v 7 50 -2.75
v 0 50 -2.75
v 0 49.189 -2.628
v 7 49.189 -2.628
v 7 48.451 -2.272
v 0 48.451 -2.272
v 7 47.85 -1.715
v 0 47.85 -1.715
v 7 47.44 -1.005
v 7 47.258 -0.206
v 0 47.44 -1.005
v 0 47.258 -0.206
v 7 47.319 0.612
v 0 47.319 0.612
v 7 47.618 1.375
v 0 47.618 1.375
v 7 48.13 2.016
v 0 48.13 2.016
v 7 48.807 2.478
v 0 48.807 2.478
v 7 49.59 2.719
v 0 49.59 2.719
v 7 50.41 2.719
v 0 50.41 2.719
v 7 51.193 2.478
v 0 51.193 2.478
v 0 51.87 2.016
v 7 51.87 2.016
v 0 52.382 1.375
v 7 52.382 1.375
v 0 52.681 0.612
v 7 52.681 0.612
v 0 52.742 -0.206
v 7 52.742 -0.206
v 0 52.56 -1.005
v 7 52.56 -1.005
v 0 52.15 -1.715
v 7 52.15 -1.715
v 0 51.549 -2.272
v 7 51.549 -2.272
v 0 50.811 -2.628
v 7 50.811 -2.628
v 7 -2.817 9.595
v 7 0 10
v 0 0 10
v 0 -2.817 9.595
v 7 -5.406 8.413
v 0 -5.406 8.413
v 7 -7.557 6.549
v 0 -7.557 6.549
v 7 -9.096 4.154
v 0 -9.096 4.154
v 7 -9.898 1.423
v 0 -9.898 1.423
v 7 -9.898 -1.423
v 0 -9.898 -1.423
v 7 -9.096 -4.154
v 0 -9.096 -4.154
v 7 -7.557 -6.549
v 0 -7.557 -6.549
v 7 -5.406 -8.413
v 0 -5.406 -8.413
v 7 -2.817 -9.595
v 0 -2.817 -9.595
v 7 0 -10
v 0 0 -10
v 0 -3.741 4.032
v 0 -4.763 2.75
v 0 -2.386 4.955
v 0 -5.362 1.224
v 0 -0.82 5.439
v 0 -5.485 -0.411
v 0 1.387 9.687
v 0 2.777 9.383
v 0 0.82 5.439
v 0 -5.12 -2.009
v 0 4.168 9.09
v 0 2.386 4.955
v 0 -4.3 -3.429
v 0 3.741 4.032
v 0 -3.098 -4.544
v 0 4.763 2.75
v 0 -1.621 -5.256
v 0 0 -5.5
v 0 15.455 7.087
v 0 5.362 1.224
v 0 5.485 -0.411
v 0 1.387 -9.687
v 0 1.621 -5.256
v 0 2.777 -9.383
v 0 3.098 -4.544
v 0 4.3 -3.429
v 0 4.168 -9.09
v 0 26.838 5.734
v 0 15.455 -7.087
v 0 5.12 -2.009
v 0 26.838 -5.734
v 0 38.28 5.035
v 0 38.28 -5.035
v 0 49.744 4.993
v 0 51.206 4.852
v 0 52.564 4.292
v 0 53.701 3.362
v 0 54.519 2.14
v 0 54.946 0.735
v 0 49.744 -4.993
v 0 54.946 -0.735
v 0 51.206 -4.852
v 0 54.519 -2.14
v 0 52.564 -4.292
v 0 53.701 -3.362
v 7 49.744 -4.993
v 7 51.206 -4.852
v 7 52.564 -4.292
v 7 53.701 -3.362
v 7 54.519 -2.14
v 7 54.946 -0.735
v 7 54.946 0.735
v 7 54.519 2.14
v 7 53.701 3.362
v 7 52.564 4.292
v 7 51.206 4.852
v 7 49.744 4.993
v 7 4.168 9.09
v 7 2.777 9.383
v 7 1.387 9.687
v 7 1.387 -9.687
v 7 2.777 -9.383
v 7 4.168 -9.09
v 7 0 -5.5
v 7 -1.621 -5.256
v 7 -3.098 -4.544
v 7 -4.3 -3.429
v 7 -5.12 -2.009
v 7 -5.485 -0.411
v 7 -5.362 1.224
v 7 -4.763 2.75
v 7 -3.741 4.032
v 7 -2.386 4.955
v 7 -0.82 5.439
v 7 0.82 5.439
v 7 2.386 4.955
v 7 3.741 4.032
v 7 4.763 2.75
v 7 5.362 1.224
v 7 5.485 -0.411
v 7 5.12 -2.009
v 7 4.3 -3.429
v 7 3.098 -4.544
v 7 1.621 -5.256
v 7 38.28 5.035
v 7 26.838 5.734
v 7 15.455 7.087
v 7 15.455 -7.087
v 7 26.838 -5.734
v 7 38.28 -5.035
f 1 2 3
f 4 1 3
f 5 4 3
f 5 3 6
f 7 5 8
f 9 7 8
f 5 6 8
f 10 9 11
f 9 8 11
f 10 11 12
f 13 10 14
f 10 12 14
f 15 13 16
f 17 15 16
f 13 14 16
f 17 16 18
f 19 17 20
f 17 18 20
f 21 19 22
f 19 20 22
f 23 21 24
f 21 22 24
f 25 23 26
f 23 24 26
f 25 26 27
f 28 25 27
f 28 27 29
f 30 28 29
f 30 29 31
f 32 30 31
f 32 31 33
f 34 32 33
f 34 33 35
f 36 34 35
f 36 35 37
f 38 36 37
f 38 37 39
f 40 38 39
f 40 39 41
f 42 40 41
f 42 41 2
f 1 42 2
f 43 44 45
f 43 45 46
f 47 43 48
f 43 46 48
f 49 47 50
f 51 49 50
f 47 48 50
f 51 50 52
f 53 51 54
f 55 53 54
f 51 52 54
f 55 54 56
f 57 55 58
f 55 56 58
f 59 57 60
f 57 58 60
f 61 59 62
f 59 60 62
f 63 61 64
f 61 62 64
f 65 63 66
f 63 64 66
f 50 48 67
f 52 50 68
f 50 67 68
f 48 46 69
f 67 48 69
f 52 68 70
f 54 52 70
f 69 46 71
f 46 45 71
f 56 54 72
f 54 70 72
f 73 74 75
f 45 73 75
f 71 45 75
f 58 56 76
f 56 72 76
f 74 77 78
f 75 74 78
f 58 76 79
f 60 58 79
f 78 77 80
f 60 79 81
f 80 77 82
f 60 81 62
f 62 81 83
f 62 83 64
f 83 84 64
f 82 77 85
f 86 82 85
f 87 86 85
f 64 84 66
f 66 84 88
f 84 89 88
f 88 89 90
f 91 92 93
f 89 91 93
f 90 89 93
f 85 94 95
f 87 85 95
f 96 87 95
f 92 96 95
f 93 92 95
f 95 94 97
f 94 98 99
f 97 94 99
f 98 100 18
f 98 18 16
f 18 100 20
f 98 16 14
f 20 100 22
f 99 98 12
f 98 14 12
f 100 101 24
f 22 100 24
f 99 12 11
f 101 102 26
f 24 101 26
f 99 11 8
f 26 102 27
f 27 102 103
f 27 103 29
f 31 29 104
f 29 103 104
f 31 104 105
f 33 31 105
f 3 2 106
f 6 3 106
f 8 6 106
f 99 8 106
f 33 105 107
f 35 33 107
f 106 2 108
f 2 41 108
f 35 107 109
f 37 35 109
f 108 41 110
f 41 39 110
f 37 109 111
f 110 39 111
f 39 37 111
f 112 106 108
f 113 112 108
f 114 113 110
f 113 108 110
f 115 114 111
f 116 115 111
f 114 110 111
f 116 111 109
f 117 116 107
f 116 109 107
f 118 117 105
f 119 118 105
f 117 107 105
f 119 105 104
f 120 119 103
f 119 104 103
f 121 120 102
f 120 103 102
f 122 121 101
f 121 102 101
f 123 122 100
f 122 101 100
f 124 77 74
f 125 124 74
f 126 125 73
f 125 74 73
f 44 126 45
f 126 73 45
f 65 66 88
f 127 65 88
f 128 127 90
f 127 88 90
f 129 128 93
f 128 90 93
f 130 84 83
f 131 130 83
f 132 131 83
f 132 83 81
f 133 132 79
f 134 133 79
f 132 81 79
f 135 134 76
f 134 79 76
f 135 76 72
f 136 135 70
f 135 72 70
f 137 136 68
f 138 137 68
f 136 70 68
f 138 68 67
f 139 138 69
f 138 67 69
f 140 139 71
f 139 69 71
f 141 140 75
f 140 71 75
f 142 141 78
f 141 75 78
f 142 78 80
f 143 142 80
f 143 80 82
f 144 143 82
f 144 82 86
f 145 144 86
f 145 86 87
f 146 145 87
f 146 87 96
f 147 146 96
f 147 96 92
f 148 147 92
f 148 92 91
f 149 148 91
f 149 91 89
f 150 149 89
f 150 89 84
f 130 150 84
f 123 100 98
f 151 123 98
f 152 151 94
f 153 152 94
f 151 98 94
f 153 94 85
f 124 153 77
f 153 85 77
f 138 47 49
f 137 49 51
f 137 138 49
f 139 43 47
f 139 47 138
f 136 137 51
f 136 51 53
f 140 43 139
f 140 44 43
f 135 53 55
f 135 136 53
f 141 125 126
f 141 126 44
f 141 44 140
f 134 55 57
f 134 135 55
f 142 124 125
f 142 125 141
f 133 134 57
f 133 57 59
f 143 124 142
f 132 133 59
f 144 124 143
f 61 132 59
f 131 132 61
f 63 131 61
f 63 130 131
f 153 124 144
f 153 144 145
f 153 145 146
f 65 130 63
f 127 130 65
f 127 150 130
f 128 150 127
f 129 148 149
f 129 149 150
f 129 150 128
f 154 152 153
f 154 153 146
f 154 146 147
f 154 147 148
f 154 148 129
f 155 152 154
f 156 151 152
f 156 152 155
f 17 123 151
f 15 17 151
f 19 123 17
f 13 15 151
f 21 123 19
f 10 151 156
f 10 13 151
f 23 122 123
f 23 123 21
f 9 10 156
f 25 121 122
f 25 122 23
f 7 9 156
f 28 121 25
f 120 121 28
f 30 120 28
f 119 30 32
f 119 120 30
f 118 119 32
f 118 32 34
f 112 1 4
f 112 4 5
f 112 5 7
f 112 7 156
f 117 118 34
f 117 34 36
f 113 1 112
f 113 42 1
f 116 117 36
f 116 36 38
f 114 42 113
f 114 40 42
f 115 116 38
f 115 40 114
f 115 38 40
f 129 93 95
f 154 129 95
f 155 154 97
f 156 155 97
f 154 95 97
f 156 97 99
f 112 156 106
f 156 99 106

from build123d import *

# Parameters (mm, degrees)
SKETCH1_R             = 5
BOSS_EXTRUDE1_DEPTH   = 7
M10_CLEARANCE_HOLE1_D = 11
M5_CLEARANCE_HOLE1_D  = 5.5


with BuildPart() as part:
    # Sketch1 → Boss-Extrude1 (new body)
    with BuildSketch(Plane(origin=(0, 0, 0), x_dir=(0, 0, -1), z_dir=(1, 0, 0))):
        with Locations((0, 50)):
            Circle(SKETCH1_R)
        with BuildLine():
            ThreePointArc((-4.99342402, 49.743647589), (-5.733969822, 26.838261478), (-9.089996824, 4.167968058))
            ThreePointArc((-9.089996824, 4.167968058), (0, 10), (9.089996824, 4.167968058))
            ThreePointArc((9.089996824, 4.167968058), (5.733969822, 26.838261478), (4.99342402, 49.743647589))
            ThreePointArc((4.99342402, 49.743647589), (0, 45), (-4.99342402, 49.743647589))
        make_face()
        with BuildLine():
            ThreePointArc((-9.089996824, 4.167968058), (-9.533884852, 2.081557577), (-10, 0))
            ThreePointArc((-10, 0), (0, -10), (10, 0))
            ThreePointArc((10, 0), (9.533884852, 2.081557577), (9.089996824, 4.167968058))
            ThreePointArc((9.089996824, 4.167968058), (0, 10), (-9.089996824, 4.167968058))
        make_face()
    extrude(amount=BOSS_EXTRUDE1_DEPTH)

    # M10 Clearance Hole1 (through all)
    with Locations(Plane(origin=(7, 0, 0), x_dir=(0, 0, 1), z_dir=(1, 0, 0))):
        with Locations((0, 0)):
            Hole(M10_CLEARANCE_HOLE1_D / 2)

    # M5 Clearance Hole1 (through all)
    with Locations(Plane(origin=(7, 50, 0), x_dir=(0, 0, 1), z_dir=(1, 0, 0))):
        with Locations((0, 0)):
            Hole(M5_CLEARANCE_HOLE1_D / 2)


solid = part.part
